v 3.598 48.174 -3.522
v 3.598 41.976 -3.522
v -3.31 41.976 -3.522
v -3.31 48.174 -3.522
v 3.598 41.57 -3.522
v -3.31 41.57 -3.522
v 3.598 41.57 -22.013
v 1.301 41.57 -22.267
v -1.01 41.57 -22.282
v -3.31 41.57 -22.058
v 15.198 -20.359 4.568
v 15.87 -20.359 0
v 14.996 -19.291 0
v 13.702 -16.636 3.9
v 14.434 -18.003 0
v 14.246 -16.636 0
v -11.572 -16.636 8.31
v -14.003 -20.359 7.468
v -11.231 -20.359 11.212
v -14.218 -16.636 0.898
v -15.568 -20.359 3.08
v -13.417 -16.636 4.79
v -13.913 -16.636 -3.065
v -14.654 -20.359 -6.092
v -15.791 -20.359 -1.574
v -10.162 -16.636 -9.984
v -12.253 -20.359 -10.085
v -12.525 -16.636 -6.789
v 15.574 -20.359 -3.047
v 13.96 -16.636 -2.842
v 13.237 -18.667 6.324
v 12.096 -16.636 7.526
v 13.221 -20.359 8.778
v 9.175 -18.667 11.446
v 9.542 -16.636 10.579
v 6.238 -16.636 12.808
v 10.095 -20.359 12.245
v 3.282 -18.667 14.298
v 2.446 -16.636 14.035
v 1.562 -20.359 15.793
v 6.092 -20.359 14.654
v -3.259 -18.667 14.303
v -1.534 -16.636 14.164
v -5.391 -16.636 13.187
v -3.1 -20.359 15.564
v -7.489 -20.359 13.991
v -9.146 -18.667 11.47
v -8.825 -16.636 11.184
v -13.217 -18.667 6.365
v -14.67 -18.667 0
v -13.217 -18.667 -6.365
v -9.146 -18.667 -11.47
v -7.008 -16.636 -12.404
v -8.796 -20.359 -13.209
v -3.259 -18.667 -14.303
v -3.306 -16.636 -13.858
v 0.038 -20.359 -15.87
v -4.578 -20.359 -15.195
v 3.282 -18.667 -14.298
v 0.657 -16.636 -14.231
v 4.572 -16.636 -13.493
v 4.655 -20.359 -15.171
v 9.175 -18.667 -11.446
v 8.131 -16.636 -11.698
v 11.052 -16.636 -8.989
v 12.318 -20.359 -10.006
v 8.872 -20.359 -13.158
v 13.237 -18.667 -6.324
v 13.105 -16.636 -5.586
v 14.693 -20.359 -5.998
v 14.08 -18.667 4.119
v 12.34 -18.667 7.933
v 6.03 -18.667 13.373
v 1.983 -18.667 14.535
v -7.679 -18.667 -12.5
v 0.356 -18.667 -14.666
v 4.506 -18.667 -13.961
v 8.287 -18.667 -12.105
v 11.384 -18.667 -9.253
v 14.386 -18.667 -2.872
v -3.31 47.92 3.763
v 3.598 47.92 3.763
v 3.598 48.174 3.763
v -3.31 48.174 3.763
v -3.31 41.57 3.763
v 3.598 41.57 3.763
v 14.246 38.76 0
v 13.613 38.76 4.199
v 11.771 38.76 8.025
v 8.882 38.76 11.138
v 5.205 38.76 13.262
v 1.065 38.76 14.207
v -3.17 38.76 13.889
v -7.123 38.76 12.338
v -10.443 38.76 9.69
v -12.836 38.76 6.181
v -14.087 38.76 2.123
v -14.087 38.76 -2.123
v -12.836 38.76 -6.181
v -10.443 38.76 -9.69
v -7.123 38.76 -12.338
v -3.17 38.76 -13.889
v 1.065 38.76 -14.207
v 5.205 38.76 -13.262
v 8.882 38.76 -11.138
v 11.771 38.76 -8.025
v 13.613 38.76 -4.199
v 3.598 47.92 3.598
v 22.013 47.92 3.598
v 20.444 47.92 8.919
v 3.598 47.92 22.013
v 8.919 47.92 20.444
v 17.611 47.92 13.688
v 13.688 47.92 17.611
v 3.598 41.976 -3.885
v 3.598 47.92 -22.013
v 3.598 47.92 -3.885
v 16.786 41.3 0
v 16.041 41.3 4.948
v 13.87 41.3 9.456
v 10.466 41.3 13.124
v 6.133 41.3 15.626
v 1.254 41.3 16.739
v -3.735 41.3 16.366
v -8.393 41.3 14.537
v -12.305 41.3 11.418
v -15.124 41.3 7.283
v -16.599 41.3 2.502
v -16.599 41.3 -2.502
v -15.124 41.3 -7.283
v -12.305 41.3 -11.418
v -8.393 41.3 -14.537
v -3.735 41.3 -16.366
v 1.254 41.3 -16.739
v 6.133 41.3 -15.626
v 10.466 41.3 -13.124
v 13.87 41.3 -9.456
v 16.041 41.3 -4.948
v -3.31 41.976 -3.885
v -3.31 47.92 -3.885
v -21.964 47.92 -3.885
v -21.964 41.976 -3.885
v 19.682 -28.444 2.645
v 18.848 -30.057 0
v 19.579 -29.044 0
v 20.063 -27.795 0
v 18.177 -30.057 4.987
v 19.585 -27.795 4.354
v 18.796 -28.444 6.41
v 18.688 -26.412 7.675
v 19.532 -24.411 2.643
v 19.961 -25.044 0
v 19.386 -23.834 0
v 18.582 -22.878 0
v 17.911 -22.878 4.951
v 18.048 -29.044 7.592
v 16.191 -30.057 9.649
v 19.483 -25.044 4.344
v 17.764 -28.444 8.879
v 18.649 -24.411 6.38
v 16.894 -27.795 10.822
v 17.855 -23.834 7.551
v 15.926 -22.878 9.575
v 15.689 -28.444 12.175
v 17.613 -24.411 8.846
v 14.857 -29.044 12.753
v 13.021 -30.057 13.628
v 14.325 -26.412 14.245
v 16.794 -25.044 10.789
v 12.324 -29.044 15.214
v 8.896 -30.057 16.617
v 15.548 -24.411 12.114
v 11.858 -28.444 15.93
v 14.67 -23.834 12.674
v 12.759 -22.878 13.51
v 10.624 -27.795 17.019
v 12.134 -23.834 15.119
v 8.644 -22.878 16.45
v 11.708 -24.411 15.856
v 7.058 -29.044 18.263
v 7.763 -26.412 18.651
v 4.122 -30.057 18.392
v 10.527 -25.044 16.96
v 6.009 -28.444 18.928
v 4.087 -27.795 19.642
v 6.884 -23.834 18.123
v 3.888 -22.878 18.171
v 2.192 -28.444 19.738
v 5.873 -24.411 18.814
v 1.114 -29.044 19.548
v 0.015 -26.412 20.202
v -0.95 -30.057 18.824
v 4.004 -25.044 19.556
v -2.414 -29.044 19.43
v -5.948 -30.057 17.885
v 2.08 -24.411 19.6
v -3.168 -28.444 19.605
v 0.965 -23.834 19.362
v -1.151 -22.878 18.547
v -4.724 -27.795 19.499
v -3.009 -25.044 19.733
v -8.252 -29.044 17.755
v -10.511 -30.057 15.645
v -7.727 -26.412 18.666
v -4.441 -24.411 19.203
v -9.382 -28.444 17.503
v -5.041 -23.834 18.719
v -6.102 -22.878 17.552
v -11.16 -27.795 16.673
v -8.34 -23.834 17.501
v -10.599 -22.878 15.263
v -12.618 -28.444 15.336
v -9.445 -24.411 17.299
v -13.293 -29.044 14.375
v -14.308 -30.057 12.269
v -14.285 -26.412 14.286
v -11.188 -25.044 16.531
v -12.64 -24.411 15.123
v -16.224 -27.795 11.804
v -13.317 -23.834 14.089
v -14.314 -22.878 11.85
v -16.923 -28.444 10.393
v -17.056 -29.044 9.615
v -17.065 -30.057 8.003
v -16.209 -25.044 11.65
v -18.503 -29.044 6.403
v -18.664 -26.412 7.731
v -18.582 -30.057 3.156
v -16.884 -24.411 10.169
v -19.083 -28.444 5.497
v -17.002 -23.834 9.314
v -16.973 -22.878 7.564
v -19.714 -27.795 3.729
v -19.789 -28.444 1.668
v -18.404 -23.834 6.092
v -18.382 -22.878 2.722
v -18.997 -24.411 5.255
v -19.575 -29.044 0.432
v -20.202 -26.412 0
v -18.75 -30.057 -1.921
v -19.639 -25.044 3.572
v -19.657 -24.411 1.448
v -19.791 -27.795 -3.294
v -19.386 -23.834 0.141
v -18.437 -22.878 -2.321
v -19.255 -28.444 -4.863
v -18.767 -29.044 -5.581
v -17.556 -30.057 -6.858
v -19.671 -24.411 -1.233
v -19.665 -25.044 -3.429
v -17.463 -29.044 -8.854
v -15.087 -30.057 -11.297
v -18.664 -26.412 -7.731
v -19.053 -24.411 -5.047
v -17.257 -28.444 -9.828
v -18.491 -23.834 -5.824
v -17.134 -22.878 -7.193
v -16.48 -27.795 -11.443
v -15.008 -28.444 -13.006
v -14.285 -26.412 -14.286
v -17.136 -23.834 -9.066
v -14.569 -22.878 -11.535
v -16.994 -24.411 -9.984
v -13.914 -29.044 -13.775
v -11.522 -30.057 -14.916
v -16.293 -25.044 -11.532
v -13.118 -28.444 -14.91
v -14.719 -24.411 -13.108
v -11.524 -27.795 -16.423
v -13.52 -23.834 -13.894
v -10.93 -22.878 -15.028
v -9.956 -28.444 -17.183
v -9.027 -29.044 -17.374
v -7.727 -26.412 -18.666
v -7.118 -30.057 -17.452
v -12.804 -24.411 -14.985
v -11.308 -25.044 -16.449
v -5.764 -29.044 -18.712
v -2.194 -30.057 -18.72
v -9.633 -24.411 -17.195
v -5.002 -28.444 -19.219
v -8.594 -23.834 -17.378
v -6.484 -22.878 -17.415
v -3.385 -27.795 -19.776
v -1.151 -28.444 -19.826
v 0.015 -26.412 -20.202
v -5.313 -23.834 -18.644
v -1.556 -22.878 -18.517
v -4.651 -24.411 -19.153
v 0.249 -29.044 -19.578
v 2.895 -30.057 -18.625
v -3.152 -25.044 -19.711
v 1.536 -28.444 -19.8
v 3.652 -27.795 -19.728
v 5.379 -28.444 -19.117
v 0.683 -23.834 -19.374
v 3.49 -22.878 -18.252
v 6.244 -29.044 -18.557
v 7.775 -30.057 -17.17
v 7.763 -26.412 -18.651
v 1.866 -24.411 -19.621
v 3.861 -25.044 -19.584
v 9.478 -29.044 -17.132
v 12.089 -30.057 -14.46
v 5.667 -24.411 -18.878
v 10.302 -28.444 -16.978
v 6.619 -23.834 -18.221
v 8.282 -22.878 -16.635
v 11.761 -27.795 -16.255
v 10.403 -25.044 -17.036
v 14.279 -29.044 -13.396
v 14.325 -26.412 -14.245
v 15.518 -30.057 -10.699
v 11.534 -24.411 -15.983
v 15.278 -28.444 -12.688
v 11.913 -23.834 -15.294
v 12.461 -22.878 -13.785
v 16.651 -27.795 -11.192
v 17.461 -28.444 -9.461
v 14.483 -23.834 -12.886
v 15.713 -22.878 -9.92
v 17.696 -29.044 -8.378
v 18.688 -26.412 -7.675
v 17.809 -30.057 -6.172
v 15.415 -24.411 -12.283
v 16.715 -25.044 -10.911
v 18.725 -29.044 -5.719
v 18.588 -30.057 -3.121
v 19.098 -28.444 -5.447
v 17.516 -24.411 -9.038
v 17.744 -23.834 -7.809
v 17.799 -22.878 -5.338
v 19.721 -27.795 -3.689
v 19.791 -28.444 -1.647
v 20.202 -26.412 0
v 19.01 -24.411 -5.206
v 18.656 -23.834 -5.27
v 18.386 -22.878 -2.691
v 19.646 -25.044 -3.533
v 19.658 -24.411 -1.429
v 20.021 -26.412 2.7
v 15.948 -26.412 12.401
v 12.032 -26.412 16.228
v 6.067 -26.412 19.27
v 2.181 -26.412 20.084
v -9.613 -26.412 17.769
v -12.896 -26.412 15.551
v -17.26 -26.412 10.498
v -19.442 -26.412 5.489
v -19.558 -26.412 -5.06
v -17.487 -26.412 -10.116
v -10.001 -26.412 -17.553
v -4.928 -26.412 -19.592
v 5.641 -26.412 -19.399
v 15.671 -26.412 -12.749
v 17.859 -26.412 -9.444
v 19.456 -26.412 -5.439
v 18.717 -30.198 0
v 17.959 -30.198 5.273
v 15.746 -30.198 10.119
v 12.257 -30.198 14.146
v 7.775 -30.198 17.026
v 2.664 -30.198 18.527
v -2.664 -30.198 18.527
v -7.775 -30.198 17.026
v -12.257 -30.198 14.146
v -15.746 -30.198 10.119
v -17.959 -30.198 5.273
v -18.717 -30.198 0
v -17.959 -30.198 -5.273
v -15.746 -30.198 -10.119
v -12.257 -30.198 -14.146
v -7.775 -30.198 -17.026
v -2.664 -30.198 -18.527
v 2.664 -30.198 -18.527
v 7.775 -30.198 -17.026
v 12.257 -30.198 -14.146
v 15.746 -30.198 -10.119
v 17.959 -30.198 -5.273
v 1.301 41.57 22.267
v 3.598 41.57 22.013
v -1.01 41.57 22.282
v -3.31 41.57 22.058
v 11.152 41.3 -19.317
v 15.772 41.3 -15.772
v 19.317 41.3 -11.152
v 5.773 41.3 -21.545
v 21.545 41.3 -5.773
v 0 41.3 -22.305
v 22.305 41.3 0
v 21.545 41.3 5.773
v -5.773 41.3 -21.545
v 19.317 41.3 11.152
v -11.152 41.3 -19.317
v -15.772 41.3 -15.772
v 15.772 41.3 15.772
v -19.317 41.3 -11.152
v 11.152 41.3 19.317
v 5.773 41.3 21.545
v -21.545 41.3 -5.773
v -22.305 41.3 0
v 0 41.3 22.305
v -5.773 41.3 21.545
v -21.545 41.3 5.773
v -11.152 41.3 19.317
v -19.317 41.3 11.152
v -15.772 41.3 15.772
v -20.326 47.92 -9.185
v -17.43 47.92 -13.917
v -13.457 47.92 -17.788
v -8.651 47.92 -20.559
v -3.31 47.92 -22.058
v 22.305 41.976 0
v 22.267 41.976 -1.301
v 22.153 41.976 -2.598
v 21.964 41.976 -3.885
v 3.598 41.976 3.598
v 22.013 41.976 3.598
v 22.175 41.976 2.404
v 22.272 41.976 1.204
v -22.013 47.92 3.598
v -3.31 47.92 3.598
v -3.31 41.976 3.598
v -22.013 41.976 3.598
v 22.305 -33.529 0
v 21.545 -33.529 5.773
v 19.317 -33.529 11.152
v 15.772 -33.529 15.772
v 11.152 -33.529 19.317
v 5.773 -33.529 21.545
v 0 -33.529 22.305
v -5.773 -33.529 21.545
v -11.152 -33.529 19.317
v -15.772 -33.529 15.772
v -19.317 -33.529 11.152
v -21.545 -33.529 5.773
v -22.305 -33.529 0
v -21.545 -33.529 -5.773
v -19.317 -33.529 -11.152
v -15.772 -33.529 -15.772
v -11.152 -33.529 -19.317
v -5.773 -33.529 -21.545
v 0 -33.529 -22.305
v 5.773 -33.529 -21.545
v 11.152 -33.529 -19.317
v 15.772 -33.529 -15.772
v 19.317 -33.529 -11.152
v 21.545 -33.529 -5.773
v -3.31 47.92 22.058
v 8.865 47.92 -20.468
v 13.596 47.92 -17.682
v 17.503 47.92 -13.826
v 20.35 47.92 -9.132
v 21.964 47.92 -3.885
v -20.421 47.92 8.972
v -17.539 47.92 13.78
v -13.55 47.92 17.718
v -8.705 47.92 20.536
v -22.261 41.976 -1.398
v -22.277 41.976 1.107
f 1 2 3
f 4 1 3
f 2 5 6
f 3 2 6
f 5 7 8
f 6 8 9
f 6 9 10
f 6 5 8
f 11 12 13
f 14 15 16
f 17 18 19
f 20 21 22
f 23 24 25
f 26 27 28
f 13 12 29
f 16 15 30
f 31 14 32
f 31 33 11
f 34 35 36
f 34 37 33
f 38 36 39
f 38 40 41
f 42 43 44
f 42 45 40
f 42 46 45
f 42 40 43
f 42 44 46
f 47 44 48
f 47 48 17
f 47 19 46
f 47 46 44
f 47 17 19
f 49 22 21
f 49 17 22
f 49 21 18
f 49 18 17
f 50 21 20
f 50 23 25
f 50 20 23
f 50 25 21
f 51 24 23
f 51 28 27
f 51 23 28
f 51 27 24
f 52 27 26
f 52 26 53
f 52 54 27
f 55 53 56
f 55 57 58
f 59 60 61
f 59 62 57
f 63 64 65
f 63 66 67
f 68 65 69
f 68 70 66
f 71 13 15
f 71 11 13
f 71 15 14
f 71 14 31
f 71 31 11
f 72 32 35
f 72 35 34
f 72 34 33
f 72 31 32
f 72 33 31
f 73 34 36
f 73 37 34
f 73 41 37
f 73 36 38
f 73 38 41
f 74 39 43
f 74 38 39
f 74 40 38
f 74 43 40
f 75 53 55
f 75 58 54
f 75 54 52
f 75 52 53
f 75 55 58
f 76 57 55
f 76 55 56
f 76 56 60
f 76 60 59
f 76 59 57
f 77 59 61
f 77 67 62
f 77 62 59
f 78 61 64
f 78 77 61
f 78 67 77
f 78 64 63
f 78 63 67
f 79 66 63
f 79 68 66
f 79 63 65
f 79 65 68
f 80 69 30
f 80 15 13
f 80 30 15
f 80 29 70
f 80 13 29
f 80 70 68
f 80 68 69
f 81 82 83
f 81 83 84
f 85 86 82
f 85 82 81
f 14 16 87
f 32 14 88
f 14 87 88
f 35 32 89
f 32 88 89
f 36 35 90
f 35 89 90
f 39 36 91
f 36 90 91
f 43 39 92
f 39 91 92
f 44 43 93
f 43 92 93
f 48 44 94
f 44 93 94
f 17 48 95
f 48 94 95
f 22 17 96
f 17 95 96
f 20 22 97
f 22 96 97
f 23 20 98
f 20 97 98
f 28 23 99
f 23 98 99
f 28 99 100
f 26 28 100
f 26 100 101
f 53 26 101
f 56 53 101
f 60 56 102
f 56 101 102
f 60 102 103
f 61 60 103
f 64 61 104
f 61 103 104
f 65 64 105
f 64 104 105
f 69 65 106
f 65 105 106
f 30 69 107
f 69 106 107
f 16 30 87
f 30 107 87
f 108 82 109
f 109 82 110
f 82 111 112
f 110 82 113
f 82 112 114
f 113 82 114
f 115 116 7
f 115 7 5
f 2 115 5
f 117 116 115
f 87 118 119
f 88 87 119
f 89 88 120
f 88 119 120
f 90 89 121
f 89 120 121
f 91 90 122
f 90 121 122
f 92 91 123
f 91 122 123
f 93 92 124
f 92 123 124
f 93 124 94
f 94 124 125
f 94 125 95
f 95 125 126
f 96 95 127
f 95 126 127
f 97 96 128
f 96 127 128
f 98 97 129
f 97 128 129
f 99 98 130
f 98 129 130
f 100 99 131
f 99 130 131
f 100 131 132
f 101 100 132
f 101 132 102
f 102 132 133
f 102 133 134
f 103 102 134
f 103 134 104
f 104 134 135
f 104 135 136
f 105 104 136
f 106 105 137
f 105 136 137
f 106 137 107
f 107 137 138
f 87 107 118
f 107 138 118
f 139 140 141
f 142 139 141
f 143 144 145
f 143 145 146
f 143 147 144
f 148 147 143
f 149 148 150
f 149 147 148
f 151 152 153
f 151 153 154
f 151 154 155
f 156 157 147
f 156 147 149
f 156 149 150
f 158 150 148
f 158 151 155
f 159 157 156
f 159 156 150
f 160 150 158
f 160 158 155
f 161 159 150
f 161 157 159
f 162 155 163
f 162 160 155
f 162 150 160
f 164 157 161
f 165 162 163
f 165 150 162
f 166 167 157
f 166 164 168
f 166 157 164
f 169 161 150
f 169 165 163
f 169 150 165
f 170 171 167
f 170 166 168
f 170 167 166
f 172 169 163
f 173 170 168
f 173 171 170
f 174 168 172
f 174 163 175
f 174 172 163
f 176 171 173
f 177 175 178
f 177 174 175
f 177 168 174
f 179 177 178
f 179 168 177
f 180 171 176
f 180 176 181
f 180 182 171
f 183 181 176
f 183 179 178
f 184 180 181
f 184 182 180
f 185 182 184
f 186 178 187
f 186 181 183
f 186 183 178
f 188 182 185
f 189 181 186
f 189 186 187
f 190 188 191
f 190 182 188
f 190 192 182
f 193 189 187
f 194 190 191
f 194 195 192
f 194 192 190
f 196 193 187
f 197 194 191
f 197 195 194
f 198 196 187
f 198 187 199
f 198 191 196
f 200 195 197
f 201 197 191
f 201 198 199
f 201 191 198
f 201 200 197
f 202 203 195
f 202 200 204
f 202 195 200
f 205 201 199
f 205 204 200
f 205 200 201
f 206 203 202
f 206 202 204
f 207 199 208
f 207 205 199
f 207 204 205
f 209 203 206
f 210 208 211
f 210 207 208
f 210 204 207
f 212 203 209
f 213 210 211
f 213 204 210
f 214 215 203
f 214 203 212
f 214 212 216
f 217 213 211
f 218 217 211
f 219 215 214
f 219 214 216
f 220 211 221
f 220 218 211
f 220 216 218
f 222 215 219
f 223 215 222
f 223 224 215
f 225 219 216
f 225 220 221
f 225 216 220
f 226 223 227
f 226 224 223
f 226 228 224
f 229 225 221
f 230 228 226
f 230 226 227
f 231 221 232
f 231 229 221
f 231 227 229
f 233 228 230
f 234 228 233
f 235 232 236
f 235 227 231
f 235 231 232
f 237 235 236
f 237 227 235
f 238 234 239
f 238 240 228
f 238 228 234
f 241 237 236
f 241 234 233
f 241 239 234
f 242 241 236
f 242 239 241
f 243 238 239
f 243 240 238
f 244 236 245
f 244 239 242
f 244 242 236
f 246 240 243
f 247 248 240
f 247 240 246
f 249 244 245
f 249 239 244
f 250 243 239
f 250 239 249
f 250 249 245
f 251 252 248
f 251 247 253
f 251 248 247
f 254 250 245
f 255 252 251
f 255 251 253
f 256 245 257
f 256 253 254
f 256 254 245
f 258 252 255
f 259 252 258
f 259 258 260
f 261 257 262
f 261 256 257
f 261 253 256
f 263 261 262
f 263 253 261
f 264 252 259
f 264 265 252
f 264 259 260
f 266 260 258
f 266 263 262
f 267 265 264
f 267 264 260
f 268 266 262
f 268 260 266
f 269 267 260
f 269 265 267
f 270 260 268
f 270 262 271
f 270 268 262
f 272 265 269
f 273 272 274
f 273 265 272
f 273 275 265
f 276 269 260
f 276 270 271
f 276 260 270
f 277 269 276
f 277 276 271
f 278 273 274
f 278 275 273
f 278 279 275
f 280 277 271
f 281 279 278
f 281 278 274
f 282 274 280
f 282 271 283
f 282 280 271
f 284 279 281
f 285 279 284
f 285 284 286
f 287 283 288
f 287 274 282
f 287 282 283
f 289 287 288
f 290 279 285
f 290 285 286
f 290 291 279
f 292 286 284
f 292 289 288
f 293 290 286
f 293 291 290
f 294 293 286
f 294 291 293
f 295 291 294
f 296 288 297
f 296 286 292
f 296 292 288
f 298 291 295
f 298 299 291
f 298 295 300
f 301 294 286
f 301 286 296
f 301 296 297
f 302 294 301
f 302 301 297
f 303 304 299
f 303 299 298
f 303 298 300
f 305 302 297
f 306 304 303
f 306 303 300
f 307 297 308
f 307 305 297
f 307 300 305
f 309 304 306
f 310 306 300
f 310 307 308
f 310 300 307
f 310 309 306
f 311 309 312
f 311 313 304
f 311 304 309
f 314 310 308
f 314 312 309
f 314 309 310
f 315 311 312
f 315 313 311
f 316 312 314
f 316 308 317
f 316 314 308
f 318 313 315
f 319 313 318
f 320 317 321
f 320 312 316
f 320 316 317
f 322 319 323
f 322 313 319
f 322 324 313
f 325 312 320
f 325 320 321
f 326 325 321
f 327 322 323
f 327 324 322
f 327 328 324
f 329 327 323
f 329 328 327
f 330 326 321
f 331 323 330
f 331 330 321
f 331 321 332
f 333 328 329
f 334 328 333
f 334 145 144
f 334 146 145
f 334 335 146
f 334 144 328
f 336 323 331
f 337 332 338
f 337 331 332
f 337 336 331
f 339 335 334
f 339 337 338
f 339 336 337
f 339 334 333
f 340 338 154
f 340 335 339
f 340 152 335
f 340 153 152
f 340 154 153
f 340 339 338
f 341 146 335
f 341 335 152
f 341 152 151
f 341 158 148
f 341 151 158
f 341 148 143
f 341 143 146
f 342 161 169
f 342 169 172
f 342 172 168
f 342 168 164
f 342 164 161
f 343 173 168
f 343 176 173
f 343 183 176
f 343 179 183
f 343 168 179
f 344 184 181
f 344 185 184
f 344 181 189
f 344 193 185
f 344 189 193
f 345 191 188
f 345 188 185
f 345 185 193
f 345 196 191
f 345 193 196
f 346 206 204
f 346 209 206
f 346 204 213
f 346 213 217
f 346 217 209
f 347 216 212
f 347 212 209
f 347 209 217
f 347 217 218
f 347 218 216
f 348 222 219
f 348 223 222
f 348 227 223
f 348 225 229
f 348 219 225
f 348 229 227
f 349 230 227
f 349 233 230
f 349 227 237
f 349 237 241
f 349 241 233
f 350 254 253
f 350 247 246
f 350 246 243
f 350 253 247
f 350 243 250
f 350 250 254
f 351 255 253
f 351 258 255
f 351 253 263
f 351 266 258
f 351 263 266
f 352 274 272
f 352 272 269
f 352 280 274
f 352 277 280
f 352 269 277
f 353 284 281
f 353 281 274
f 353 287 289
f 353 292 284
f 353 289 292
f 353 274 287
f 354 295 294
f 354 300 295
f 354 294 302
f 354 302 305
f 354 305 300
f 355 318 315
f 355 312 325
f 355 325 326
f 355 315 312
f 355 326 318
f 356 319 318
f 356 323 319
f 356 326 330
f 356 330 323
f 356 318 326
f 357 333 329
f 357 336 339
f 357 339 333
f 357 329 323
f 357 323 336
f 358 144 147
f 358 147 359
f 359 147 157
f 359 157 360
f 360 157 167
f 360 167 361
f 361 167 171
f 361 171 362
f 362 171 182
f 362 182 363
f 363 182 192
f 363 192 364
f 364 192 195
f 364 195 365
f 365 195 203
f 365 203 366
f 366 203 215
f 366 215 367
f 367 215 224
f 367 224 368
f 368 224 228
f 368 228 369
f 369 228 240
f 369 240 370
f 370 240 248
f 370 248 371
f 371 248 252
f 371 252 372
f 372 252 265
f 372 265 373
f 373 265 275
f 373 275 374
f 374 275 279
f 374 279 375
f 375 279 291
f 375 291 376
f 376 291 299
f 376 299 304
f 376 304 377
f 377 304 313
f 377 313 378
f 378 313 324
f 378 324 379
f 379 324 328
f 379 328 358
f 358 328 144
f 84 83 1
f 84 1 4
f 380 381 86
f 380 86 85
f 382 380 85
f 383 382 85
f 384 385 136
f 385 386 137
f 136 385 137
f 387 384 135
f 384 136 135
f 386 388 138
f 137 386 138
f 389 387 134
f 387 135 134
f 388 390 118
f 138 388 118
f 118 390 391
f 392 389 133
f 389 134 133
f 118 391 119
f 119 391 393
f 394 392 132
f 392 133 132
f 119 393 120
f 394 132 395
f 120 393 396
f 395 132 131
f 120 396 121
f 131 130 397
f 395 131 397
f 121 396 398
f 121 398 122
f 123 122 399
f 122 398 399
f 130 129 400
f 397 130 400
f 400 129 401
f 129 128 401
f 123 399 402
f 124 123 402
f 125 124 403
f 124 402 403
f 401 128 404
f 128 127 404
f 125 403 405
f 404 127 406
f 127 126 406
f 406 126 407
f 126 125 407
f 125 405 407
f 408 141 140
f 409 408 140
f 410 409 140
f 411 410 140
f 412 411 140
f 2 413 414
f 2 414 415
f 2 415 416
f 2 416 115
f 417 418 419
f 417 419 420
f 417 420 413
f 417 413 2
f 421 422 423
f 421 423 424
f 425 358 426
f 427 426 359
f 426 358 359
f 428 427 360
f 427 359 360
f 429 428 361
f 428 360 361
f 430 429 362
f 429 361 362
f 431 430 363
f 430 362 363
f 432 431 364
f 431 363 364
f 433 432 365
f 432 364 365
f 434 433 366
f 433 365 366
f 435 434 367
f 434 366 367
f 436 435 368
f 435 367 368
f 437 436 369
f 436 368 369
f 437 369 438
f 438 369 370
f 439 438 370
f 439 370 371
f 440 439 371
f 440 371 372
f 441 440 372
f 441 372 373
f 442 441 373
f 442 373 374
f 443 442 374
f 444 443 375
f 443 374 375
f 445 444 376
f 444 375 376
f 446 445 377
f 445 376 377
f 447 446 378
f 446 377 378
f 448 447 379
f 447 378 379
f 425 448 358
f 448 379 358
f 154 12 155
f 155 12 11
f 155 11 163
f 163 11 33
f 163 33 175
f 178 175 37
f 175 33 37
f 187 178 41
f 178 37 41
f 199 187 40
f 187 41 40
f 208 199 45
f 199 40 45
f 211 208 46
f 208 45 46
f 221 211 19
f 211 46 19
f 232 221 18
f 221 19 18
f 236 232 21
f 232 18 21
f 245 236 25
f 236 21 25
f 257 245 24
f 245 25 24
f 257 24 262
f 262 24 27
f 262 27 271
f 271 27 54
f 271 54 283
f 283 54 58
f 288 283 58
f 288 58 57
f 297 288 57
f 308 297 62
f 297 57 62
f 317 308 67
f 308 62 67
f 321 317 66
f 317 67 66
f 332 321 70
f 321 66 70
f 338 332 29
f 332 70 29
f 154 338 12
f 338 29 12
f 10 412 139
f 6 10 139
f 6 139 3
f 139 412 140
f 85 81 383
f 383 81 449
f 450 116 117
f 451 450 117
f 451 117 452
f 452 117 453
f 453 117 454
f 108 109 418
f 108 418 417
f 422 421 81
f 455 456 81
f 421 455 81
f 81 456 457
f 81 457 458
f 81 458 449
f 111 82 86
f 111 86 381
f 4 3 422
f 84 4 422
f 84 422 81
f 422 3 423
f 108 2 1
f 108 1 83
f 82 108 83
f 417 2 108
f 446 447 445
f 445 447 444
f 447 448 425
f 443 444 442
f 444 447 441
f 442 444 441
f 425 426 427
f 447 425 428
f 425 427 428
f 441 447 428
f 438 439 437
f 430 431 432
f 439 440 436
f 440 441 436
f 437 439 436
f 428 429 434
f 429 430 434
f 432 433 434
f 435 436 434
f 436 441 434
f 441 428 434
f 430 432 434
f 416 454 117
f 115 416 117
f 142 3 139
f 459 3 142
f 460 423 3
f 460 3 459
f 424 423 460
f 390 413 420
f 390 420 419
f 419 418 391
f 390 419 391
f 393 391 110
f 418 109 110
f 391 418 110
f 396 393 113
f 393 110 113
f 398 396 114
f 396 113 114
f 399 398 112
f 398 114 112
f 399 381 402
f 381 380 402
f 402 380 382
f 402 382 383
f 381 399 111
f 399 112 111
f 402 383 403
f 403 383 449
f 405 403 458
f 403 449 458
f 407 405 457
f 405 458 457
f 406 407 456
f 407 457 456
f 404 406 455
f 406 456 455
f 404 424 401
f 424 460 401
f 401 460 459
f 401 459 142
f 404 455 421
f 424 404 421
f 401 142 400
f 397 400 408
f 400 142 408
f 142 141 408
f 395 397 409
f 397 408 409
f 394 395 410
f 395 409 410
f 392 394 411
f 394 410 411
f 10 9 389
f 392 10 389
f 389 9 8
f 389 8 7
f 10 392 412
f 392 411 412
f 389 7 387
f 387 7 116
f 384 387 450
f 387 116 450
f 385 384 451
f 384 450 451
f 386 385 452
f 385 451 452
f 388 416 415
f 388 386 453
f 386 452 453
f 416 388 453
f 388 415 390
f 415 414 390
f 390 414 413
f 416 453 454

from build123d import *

# Parameters (mm, degrees)
F2_R     = 5.08
F3_SIZE  = 2.54
F4_W     = 6.907339
F4_H     = 51.517231
F5_DEPTH = 6.35
F6_W     = 52.092841
F6_H     = 7.48295
F7_DEPTH = 5.9436
F8_W     = 6.907339
F8_H     = 7.284426
F9_DEPTH = 6.604


with BuildPart() as f1:
    # F0 (on Top) → F1 (revolve)
    with BuildSketch(Plane.XY):
        Polygon((22.304947, 47.919661), (0, 47.919661), (0, -33.52937), (22.304947, -33.52937), (18.717232, -30.197919), (22.304947, -26.334228), (14.246386, -18.851276), (14.246386, 41.300129), (22.304947, 41.300129), align=None)
    revolve(axis=Axis((0, 7.195146, 0), (0, -1, 0)))

    # F2
    f2_edges = [f1.edges().sort_by_distance(p)[0] for p in [
        (-22.304947, -26.334228, 0),
        (-14.246386, -18.851276, 0),
    ]]
    fillet(f2_edges, radius=F2_R)

    # F3
    f3_edges = [f1.edges().sort_by_distance(p)[0] for p in [
        (14.246386, 12.332043, 0),
        (-14.246383, -16.636044, 0),
        (-14.246386, 41.300129, 0),
    ]]
    chamfer(f3_edges, length=F3_SIZE)

    # F4 (on face) → F5 (cut)
    with BuildSketch(Plane(origin=(0, 47.919661, 0), x_dir=(-1, 0, 0), z_dir=(0, 1, 0))):
        with Locations((-0.143903, 0.575613)):
            Rectangle(F4_W, F4_H)
    extrude(amount=-F5_DEPTH, mode=Mode.SUBTRACT)

    # F6 (on face) → F7 (cut)
    with BuildSketch(Plane(origin=(0, 47.919661, 0), x_dir=(-1, 0, 0), z_dir=(0, 1, 0))):
        with Locations((0.287805, -0.143903)):
            Rectangle(F6_W, F6_H)
    extrude(amount=-F7_DEPTH, mode=Mode.SUBTRACT)

    # F8 (on face) → F9 (join)
    with BuildSketch(Plane(origin=(0, 41.569661, 0), x_dir=(-1, 0, 0), z_dir=(0, 1, 0))):
        with Locations((-0.143903, 0.12047)):
            Rectangle(F8_W, F8_H)
    extrude(amount=F9_DEPTH)


solid = f1.part
